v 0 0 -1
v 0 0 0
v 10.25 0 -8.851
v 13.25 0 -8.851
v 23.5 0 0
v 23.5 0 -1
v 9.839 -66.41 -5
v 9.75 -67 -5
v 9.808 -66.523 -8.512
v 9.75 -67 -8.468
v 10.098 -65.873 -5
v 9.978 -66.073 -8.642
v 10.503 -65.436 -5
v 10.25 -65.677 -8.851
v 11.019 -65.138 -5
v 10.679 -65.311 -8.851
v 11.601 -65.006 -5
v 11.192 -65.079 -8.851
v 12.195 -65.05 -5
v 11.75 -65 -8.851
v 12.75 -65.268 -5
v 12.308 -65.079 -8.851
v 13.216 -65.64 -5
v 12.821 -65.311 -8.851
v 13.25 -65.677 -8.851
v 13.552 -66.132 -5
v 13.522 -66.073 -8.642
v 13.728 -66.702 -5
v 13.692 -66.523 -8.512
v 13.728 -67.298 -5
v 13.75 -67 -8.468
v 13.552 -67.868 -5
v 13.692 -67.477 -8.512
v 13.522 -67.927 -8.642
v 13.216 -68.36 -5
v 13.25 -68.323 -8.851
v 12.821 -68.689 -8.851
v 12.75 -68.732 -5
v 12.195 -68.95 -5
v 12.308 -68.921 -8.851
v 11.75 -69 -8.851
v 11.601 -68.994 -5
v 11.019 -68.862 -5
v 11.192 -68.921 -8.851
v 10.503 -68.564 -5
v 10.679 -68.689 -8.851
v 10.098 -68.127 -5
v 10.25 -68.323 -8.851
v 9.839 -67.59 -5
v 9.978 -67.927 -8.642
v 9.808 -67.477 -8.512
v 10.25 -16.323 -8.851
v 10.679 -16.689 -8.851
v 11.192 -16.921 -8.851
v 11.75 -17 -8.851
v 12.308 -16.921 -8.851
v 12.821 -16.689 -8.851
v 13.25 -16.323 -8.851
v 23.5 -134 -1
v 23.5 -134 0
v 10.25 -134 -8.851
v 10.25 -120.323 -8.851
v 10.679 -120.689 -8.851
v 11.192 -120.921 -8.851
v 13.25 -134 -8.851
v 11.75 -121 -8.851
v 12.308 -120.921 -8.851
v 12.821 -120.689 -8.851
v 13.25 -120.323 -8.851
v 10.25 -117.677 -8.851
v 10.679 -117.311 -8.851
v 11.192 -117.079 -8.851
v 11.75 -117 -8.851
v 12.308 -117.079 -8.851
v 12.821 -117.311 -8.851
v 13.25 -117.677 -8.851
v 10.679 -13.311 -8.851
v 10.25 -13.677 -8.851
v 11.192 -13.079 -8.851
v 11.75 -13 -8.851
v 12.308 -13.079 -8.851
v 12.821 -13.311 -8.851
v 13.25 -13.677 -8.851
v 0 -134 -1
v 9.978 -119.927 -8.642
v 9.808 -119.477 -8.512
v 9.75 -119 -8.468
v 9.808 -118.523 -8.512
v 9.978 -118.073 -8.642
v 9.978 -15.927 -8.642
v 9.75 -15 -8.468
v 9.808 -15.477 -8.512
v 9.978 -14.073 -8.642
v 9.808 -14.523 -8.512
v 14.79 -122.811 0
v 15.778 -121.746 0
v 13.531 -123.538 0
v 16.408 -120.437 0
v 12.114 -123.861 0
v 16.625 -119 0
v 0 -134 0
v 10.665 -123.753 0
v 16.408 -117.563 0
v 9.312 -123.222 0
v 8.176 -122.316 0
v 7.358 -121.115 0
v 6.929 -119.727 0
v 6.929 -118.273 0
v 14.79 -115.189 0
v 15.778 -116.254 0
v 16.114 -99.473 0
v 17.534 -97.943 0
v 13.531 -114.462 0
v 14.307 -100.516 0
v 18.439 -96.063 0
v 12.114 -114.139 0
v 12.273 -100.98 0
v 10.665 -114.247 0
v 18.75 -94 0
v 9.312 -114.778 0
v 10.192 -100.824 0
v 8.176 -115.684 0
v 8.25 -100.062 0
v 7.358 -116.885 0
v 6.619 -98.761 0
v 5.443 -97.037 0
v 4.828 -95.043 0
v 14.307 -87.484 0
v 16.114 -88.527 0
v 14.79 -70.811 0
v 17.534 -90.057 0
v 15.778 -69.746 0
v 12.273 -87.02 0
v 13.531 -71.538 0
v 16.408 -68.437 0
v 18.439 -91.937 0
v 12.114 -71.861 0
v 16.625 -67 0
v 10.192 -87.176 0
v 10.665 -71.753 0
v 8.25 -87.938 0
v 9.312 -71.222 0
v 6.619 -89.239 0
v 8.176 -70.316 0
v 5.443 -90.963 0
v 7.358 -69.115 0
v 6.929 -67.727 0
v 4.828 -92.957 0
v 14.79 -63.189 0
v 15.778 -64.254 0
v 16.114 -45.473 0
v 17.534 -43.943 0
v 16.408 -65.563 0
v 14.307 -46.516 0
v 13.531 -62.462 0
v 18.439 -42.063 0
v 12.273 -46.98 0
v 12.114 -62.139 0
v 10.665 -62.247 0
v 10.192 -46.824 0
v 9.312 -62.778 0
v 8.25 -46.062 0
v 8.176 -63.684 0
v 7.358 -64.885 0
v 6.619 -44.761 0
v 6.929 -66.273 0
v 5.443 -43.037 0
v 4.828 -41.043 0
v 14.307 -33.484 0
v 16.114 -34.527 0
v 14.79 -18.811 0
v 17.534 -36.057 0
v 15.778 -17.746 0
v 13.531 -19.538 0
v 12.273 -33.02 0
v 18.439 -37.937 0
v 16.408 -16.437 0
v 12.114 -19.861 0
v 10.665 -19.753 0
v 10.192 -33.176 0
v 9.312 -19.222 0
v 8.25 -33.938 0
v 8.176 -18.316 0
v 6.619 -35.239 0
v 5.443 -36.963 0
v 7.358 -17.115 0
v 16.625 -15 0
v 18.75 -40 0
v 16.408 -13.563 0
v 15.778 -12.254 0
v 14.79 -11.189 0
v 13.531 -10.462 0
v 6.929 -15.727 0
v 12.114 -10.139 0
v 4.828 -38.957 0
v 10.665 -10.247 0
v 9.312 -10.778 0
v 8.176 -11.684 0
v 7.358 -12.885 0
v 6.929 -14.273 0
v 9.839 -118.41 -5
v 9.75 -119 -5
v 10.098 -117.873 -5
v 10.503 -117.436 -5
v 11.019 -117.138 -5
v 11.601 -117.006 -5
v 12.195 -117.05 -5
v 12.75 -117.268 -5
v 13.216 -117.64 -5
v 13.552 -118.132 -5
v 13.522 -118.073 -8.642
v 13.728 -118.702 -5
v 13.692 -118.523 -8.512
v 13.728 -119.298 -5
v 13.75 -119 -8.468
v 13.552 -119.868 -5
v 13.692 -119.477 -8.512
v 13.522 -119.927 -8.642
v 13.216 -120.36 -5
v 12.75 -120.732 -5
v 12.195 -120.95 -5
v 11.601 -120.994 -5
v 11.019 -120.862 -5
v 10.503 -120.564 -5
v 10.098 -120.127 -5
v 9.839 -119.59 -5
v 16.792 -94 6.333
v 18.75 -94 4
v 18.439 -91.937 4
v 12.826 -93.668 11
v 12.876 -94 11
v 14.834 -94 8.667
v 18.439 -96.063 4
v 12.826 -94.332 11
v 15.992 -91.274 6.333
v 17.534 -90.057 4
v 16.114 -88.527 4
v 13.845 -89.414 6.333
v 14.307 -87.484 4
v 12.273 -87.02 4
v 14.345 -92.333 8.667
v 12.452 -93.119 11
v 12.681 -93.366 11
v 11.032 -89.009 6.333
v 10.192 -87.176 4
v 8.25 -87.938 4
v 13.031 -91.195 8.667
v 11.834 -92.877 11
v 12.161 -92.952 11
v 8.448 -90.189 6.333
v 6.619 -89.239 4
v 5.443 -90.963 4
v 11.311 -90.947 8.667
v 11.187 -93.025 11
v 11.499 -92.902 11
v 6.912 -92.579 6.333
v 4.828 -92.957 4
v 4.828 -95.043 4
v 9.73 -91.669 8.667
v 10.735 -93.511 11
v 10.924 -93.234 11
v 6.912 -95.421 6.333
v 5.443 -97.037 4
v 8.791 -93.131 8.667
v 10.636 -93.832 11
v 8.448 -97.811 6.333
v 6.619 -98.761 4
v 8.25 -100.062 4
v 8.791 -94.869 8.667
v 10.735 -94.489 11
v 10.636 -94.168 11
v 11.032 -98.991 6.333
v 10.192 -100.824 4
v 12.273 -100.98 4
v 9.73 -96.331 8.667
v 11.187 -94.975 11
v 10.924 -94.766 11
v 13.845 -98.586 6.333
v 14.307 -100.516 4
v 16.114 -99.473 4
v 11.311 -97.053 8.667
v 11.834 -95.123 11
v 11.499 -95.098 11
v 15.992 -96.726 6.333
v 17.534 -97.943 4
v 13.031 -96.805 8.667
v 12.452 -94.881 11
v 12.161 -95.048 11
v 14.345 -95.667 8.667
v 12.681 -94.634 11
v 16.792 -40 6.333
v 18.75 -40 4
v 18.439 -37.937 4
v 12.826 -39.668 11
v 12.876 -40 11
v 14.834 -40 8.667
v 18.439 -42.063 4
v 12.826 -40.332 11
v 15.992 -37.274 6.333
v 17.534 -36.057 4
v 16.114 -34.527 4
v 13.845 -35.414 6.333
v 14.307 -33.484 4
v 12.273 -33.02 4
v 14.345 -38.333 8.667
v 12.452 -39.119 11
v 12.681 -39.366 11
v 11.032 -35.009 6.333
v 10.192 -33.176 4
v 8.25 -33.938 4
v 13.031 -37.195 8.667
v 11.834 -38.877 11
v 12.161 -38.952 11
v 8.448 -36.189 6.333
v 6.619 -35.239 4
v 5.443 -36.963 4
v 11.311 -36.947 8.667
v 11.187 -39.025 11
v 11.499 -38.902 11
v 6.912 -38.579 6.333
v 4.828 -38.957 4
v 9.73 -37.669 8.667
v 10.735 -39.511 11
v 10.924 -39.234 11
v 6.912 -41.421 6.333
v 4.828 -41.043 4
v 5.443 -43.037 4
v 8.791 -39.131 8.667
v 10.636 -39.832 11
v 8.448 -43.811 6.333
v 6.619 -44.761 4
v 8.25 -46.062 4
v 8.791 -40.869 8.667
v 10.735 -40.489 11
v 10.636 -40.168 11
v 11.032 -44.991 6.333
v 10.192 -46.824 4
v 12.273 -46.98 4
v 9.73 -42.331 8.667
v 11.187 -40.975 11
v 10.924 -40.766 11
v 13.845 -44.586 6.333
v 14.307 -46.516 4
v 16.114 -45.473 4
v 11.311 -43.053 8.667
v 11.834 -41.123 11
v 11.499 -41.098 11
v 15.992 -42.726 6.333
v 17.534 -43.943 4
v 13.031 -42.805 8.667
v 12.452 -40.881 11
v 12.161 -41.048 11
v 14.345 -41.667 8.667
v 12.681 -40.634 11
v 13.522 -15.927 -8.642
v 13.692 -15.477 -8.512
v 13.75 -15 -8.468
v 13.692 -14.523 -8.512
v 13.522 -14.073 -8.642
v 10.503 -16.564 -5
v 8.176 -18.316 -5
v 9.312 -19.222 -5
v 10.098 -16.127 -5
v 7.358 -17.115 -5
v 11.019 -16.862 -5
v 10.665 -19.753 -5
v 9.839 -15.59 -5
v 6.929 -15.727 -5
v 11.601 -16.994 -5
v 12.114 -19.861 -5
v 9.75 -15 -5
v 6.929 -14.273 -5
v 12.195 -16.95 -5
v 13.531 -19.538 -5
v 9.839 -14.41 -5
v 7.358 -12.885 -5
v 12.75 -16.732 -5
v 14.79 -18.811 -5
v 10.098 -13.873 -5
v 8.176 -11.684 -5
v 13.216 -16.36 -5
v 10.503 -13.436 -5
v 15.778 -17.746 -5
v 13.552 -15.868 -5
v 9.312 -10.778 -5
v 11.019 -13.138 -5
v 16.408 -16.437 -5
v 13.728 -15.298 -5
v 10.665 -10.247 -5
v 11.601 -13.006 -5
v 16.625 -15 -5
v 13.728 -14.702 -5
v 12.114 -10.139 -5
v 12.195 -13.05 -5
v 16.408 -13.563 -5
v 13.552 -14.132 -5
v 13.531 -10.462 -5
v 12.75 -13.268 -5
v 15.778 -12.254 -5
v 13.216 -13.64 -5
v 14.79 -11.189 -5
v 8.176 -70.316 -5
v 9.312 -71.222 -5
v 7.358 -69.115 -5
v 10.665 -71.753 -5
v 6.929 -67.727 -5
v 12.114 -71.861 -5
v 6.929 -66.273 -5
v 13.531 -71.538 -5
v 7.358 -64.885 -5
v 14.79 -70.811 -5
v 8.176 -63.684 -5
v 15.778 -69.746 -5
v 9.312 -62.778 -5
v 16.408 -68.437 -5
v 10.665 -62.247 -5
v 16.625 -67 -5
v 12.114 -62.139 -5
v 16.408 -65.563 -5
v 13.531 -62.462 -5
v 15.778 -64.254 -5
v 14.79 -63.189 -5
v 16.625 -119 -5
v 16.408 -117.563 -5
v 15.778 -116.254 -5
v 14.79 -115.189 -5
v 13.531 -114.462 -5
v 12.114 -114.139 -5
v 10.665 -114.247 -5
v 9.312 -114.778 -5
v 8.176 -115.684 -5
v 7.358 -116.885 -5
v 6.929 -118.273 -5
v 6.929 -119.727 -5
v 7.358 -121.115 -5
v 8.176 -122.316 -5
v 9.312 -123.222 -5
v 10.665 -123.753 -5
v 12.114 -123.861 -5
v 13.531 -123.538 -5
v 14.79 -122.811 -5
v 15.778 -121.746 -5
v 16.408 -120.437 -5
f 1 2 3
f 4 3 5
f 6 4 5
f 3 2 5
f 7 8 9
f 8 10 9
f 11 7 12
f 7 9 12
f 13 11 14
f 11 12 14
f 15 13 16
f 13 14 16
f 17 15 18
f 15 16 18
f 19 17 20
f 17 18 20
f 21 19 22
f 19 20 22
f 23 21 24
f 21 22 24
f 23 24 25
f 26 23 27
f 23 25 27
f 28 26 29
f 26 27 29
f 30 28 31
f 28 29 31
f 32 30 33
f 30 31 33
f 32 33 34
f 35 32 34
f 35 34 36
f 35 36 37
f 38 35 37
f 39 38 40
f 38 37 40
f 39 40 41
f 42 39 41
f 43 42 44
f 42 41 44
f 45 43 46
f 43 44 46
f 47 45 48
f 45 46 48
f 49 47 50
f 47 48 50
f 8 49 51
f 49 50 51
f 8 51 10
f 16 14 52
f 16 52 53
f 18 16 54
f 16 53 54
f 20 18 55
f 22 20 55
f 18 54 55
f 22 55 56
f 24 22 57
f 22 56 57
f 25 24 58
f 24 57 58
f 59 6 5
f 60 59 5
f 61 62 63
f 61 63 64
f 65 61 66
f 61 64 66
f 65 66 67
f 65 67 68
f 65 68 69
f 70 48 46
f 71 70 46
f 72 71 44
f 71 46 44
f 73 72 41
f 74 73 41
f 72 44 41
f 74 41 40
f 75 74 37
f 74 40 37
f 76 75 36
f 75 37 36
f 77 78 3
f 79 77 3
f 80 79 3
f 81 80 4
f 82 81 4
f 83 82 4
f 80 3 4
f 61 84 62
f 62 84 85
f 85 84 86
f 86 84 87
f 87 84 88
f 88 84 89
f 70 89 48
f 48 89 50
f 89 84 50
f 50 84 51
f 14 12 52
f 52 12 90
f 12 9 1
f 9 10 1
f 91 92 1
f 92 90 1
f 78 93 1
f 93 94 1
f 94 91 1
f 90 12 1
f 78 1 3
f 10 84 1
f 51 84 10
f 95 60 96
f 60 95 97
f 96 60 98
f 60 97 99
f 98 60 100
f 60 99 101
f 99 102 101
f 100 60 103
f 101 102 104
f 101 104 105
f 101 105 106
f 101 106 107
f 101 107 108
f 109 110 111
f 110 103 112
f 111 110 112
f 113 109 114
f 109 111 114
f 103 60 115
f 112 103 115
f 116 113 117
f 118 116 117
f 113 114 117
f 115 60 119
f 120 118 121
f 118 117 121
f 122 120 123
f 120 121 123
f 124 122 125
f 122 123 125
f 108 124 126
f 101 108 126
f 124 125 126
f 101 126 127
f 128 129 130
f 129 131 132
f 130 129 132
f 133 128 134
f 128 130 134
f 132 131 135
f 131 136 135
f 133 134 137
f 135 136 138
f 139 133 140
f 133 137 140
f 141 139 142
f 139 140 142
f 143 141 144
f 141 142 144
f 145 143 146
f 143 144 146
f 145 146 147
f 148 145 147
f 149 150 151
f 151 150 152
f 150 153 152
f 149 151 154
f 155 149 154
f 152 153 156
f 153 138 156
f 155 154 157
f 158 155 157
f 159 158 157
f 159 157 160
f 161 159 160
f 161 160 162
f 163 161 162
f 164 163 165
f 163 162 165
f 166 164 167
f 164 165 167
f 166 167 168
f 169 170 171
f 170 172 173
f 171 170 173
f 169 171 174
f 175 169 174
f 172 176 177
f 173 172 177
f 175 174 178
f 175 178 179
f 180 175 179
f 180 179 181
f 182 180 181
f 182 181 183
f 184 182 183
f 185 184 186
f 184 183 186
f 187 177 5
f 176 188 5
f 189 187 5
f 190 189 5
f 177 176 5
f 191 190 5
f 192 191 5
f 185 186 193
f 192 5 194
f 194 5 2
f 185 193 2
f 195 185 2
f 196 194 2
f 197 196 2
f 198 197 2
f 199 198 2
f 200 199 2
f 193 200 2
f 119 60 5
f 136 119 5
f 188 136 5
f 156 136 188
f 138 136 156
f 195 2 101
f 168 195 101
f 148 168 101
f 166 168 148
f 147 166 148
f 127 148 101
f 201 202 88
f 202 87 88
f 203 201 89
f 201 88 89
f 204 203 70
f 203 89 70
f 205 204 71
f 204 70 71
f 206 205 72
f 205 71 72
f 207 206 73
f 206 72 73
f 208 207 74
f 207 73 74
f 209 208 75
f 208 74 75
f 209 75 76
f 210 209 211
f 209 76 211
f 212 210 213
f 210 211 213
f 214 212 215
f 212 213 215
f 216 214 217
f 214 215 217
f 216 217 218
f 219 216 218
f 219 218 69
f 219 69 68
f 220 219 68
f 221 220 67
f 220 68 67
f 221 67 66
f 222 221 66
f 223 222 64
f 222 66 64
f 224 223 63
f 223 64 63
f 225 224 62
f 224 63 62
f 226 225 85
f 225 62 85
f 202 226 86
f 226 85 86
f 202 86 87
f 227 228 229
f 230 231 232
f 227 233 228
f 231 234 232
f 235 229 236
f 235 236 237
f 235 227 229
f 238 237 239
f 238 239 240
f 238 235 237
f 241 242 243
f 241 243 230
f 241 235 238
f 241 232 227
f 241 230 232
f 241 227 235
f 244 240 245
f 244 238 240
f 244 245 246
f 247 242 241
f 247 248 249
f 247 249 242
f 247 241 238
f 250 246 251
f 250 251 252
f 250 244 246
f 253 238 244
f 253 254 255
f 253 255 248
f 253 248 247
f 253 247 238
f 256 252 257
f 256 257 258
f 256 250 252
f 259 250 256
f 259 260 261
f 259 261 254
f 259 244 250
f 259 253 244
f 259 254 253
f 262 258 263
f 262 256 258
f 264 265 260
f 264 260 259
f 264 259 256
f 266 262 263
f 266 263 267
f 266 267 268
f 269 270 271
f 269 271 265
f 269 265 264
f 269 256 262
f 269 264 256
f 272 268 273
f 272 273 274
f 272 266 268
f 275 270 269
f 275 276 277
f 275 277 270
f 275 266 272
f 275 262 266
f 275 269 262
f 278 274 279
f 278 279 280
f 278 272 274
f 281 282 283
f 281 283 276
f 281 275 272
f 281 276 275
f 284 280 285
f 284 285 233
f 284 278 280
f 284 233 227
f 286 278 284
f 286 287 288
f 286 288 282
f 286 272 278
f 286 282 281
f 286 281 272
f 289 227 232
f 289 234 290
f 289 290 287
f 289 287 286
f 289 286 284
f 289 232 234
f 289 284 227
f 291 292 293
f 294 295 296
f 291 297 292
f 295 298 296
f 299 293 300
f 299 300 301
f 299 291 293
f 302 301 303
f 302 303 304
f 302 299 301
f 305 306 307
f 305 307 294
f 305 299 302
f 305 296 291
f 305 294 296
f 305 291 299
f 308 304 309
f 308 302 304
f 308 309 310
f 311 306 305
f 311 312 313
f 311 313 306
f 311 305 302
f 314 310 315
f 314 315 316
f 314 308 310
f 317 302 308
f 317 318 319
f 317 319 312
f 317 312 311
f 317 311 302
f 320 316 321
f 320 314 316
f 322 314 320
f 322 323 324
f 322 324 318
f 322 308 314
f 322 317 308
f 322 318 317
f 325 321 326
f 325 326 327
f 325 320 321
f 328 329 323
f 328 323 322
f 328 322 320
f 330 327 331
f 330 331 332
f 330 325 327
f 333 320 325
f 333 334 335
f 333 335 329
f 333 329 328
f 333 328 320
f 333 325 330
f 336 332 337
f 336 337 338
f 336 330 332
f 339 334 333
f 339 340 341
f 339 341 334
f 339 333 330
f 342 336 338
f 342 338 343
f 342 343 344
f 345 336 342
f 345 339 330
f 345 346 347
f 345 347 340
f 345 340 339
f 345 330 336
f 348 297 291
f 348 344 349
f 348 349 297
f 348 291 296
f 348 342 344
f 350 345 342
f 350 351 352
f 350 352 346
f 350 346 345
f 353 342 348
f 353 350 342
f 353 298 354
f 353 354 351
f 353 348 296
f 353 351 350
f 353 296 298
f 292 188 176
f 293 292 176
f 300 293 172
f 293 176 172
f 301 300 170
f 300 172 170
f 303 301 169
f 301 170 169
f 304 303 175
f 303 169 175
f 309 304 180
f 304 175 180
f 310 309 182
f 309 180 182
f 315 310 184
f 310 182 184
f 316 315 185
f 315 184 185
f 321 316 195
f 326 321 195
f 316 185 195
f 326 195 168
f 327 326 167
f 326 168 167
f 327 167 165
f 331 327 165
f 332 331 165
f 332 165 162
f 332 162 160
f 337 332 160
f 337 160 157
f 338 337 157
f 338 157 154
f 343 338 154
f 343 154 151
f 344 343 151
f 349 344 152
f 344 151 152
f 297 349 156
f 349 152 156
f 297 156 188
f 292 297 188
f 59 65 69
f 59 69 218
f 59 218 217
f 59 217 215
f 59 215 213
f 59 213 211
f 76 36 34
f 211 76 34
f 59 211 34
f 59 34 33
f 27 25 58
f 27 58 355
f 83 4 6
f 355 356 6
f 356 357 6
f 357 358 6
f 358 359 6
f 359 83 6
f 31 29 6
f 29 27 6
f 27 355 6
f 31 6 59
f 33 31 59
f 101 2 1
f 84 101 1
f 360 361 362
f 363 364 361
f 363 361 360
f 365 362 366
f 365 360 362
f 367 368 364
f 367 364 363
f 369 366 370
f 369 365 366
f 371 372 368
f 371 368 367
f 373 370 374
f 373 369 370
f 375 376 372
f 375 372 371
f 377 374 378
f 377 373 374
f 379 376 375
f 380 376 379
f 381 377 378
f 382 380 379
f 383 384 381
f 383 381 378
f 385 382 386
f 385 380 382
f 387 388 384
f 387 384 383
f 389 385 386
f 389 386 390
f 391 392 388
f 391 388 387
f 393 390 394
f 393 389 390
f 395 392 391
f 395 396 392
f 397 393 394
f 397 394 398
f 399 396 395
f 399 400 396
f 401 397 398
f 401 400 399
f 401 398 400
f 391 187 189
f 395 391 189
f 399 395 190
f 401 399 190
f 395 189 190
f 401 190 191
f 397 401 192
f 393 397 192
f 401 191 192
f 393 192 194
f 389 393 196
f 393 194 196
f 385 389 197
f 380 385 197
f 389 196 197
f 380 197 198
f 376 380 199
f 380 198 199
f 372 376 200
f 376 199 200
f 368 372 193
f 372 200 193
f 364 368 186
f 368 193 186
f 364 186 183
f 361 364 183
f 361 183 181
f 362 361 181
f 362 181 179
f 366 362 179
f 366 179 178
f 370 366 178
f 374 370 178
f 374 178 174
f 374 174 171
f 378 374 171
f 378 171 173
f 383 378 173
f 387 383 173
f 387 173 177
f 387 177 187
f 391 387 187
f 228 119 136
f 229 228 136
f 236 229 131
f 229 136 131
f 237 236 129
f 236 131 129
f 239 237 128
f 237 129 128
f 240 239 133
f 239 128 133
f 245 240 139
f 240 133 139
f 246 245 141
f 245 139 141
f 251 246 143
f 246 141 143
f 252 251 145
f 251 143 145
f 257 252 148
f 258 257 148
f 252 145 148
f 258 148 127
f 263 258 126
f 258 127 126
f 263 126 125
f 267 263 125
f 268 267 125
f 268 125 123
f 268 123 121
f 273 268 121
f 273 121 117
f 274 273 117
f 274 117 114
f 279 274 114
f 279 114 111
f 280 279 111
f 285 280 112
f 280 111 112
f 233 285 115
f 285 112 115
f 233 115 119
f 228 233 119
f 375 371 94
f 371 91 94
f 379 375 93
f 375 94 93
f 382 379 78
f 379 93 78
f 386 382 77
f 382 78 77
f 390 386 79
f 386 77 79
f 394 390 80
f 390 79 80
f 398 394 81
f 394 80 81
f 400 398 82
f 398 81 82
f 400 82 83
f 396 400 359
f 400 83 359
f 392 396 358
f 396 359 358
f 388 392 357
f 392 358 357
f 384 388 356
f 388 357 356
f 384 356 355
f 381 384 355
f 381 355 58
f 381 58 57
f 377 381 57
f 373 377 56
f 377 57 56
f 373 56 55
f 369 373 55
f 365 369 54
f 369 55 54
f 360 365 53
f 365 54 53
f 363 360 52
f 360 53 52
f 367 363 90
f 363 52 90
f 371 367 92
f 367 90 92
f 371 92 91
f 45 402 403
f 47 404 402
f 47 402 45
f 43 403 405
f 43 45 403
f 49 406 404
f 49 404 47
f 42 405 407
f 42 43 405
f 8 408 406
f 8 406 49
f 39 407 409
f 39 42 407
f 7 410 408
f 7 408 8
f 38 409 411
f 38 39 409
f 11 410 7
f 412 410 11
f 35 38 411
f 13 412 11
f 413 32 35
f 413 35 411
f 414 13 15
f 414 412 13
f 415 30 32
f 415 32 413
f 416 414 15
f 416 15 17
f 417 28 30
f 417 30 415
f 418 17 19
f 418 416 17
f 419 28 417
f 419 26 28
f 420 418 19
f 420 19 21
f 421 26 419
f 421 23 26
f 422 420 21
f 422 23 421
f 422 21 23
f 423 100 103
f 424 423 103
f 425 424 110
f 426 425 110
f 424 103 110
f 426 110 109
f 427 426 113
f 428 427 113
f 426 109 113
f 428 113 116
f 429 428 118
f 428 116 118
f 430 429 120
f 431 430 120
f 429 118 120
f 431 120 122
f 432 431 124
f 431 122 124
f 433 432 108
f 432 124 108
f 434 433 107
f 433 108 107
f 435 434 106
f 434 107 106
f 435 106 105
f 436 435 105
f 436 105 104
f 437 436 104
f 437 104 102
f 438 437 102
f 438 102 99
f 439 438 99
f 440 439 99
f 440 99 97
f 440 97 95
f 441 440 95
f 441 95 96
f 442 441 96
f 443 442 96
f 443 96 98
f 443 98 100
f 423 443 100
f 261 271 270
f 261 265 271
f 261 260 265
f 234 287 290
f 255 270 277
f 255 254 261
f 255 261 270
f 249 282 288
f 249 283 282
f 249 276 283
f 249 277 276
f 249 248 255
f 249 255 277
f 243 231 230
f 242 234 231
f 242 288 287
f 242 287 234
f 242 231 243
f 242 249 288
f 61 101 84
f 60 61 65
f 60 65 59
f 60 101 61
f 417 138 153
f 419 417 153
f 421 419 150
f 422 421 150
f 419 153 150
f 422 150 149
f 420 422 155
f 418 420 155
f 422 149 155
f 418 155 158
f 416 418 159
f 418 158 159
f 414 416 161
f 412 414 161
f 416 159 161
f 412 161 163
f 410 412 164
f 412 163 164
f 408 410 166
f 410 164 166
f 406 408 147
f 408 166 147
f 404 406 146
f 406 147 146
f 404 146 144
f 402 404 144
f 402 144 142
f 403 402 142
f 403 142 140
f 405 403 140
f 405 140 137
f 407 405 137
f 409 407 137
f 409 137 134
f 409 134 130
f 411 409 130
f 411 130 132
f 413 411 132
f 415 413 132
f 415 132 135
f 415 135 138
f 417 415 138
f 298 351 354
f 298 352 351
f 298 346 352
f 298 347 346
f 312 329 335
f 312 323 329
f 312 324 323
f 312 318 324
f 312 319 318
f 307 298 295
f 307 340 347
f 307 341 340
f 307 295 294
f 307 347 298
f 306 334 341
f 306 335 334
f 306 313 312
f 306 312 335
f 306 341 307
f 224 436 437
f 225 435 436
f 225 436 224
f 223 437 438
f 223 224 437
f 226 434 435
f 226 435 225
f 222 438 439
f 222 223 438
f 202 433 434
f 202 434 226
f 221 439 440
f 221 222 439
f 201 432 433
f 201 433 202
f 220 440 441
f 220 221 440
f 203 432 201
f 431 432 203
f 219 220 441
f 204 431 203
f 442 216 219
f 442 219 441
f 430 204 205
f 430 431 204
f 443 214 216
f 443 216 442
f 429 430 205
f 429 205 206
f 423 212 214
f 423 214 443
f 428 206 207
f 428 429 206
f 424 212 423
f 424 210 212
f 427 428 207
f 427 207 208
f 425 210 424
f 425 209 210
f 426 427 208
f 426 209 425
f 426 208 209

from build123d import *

# Parameters (mm, degrees)
F1_DEPTH       = 134
F3_D           = 4
F3_CBORE_D     = 9.75
F3_CBORE_DEPTH = 5
F4_R           = 7
F5_DEPTH       = 4
F6_R           = 7
F7_DEPTH       = 7
F7_TAPER       = 40


with BuildPart() as f1:
    # F0 (on Front) → F1 (new body)
    with BuildSketch(Plane.XZ):
        Polygon((23.5, 0), (0, 0), (0, -1), (10.25, -8.8510638298), (13.25, -8.8510638298), (23.5, -1), align=None)
    extrude(amount=F1_DEPTH)

    # F3 (through all)
    with Locations(Plane.XY):
        with Locations((11.75, -15), (11.75, -67), (11.75, -119)):
            CounterBoreHole(F3_D / 2, F3_CBORE_D / 2, F3_CBORE_DEPTH)

    # F4 (on face) → F5 (join)
    with BuildSketch(Plane.XY):
        with Locations((11.75, -40)):
            Circle(F4_R)
        with Locations((11.75, -94)):
            Circle(F4_R)
    extrude(amount=F5_DEPTH)

    # F6 (on face) → F7 (join)
    with BuildSketch(Plane.XY.offset(4)):
        with Locations((11.75, -40)):
            Circle(F6_R)
        with Locations((11.75, -94)):
            Circle(F6_R)
    extrude(amount=F7_DEPTH, taper=F7_TAPER)


solid = f1.part
